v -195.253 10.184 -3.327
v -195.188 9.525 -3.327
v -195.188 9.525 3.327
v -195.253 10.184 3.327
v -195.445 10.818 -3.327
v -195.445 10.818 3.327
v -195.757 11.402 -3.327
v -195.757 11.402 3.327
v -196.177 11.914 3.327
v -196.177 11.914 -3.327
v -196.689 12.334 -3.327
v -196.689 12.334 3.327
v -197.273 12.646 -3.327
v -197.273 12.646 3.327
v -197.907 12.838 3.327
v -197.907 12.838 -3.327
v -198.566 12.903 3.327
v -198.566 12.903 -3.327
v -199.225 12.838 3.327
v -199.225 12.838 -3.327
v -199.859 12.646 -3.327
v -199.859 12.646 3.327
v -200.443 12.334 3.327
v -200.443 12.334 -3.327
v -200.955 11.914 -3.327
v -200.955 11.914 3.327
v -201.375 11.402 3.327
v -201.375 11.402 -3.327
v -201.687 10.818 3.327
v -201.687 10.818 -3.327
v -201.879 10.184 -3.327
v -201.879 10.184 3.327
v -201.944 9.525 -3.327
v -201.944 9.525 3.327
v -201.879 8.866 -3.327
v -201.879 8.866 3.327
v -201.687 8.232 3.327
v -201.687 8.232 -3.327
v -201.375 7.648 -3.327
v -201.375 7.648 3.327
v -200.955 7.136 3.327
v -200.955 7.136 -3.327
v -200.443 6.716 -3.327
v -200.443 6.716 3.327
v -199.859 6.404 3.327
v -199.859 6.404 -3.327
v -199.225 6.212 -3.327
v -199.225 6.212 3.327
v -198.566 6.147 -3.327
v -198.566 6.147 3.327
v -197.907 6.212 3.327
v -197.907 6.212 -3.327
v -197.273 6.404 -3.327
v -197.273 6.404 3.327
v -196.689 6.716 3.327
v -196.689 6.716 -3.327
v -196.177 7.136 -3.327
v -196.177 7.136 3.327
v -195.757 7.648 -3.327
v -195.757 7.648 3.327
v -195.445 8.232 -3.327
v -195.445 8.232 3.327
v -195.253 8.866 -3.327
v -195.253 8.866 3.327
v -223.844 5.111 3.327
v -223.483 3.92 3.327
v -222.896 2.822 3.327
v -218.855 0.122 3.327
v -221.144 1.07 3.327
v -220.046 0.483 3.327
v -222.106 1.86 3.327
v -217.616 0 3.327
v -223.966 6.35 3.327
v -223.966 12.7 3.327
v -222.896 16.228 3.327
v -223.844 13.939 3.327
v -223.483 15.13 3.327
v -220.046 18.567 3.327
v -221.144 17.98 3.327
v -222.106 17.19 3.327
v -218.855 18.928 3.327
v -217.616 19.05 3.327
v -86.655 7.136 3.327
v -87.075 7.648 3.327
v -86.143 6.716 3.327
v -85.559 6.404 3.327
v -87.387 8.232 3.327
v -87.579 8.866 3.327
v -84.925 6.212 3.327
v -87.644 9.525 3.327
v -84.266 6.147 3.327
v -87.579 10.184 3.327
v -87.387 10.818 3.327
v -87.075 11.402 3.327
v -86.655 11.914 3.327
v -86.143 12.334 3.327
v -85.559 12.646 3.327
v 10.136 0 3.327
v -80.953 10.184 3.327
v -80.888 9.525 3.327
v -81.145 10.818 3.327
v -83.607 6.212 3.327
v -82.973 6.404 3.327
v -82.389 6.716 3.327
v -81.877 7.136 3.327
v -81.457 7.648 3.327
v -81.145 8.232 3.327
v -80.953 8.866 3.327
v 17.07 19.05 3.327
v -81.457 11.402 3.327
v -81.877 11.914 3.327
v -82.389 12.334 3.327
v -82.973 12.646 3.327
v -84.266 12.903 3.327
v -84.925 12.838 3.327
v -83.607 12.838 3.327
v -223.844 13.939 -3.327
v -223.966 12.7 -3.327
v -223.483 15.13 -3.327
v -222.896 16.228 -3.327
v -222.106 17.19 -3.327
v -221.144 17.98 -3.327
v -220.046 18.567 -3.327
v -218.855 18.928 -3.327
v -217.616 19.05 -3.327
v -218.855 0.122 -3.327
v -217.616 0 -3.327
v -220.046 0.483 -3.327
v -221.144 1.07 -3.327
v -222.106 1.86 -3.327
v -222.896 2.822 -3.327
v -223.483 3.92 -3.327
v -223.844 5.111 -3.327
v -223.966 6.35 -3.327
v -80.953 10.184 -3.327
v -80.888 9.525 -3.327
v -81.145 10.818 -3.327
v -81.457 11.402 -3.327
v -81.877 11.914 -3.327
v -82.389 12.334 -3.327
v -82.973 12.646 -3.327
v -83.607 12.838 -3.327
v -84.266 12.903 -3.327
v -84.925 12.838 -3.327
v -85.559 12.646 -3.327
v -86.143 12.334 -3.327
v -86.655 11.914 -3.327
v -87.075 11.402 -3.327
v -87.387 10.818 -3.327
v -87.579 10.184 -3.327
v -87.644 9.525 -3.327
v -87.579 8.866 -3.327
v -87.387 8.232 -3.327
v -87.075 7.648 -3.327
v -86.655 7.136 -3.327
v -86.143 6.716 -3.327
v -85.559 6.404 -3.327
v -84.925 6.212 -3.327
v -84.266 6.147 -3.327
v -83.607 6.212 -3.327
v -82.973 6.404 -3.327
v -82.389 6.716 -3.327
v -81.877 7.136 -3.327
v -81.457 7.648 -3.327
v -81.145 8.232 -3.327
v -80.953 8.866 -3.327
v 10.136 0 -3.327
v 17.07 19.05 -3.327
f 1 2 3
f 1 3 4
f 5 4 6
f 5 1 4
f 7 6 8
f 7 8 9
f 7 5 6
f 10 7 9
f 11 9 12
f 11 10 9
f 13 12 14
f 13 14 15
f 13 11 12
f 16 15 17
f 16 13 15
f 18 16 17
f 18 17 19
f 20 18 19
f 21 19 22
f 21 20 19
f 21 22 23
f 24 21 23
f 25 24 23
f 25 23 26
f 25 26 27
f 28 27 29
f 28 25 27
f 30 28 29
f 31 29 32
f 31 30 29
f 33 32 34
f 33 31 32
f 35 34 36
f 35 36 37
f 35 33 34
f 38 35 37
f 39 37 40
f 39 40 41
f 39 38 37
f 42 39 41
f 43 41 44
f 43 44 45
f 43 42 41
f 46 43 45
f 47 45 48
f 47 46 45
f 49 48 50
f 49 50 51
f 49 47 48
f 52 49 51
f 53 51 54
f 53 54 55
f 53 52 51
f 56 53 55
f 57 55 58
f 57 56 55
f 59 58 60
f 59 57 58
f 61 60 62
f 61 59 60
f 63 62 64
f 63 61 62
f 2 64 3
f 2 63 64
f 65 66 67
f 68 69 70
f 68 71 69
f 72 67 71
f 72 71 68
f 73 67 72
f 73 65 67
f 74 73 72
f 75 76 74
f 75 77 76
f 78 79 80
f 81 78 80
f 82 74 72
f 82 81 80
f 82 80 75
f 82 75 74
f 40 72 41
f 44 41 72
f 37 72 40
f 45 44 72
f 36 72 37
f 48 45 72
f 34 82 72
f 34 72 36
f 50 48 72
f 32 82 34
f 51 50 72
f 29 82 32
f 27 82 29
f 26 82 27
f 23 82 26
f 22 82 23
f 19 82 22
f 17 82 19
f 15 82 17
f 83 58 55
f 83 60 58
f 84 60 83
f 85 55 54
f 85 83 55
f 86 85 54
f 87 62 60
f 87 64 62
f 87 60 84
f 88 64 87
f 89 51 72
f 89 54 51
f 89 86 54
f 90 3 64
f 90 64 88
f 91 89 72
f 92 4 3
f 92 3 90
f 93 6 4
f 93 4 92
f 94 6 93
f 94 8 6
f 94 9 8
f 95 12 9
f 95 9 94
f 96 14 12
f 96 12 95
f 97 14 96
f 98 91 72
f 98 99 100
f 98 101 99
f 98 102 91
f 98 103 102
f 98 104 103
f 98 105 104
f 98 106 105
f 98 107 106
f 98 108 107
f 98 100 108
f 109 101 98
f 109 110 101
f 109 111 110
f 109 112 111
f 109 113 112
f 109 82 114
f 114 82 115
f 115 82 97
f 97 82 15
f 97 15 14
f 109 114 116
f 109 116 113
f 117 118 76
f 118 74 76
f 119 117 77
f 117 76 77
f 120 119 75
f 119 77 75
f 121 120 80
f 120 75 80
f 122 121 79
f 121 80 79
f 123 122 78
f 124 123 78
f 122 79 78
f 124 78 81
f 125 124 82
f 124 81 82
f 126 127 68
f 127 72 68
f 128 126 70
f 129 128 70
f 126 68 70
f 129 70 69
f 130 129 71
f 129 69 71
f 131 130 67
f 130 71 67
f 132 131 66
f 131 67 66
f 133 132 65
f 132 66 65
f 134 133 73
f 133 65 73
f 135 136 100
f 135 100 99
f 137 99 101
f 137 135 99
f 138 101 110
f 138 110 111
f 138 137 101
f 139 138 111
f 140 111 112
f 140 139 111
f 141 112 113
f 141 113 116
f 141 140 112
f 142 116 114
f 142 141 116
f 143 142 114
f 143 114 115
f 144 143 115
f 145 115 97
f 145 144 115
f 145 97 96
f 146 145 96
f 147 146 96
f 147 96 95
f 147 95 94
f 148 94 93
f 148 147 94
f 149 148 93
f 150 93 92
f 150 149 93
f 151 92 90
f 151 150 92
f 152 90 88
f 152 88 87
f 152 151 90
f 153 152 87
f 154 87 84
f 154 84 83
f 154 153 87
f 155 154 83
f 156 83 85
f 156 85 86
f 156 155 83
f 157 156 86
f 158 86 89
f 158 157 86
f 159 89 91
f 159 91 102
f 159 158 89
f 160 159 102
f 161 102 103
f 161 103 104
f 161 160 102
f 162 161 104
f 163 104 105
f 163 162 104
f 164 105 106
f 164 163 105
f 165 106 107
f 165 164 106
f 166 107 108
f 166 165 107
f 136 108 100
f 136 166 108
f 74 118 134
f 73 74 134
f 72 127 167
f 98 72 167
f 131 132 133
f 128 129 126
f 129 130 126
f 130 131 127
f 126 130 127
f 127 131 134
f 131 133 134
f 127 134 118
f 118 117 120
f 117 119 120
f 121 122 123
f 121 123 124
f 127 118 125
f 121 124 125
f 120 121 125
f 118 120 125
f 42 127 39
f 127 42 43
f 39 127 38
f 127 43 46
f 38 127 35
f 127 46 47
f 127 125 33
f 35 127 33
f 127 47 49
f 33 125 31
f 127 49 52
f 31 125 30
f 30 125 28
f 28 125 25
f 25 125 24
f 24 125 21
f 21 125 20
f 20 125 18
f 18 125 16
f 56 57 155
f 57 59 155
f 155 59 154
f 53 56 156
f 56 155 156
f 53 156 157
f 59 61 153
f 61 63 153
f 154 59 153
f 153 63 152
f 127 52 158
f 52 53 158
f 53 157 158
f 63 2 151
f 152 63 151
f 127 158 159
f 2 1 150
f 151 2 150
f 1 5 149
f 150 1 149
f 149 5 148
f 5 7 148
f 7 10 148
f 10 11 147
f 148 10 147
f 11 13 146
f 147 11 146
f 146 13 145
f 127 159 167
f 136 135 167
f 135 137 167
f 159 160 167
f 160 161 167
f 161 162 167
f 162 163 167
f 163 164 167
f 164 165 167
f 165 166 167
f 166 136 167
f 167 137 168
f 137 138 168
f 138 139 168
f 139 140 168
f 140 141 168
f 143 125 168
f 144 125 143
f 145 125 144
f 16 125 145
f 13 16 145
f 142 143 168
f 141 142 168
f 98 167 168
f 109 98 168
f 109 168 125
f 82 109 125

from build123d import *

# Parameters (mm, degrees)
STOCK_KEEL_BULB_SUPPORT_1_START     = -3.3274
STOCK_KEEL_BULB_SUPPORT_1_OUTLINE_R = 3.3782
STOCK_KEEL_BULB_SUPPORT_1_DEPTH     = 6.6548
FILLET1_R                           = 6.35


# Read off the part's stored shape, not the designer's step: Stock-Keel_bulb_support-1
with BuildPart() as part:
    # Stock-Keel_bulb_support-1 outline → Stock-Keel_bulb_support-1 (new body)
    with BuildSketch(Plane.XY.offset(STOCK_KEEL_BULB_SUPPORT_1_START)):
        Polygon((-223.965917593, 0), (10.136293283, 0), (17.069926246, 19.05), (-223.965917593, 19.05), align=None)
        with Locations((-198.565917593, 9.525)):
            Circle(STOCK_KEEL_BULB_SUPPORT_1_OUTLINE_R, mode=Mode.SUBTRACT)
        with Locations((-84.265917593, 9.525)):
            Circle(STOCK_KEEL_BULB_SUPPORT_1_OUTLINE_R, mode=Mode.SUBTRACT)
    extrude(amount=STOCK_KEEL_BULB_SUPPORT_1_DEPTH)

    # Fillet1
    fillet1_edges = [part.edges().sort_by_distance(p)[0] for p in [
        (-223.965917593, 19.05, 0),
        (-223.965917593, 0, 0),
    ]]
    fillet(fillet1_edges, radius=FILLET1_R)


solid = part.part
